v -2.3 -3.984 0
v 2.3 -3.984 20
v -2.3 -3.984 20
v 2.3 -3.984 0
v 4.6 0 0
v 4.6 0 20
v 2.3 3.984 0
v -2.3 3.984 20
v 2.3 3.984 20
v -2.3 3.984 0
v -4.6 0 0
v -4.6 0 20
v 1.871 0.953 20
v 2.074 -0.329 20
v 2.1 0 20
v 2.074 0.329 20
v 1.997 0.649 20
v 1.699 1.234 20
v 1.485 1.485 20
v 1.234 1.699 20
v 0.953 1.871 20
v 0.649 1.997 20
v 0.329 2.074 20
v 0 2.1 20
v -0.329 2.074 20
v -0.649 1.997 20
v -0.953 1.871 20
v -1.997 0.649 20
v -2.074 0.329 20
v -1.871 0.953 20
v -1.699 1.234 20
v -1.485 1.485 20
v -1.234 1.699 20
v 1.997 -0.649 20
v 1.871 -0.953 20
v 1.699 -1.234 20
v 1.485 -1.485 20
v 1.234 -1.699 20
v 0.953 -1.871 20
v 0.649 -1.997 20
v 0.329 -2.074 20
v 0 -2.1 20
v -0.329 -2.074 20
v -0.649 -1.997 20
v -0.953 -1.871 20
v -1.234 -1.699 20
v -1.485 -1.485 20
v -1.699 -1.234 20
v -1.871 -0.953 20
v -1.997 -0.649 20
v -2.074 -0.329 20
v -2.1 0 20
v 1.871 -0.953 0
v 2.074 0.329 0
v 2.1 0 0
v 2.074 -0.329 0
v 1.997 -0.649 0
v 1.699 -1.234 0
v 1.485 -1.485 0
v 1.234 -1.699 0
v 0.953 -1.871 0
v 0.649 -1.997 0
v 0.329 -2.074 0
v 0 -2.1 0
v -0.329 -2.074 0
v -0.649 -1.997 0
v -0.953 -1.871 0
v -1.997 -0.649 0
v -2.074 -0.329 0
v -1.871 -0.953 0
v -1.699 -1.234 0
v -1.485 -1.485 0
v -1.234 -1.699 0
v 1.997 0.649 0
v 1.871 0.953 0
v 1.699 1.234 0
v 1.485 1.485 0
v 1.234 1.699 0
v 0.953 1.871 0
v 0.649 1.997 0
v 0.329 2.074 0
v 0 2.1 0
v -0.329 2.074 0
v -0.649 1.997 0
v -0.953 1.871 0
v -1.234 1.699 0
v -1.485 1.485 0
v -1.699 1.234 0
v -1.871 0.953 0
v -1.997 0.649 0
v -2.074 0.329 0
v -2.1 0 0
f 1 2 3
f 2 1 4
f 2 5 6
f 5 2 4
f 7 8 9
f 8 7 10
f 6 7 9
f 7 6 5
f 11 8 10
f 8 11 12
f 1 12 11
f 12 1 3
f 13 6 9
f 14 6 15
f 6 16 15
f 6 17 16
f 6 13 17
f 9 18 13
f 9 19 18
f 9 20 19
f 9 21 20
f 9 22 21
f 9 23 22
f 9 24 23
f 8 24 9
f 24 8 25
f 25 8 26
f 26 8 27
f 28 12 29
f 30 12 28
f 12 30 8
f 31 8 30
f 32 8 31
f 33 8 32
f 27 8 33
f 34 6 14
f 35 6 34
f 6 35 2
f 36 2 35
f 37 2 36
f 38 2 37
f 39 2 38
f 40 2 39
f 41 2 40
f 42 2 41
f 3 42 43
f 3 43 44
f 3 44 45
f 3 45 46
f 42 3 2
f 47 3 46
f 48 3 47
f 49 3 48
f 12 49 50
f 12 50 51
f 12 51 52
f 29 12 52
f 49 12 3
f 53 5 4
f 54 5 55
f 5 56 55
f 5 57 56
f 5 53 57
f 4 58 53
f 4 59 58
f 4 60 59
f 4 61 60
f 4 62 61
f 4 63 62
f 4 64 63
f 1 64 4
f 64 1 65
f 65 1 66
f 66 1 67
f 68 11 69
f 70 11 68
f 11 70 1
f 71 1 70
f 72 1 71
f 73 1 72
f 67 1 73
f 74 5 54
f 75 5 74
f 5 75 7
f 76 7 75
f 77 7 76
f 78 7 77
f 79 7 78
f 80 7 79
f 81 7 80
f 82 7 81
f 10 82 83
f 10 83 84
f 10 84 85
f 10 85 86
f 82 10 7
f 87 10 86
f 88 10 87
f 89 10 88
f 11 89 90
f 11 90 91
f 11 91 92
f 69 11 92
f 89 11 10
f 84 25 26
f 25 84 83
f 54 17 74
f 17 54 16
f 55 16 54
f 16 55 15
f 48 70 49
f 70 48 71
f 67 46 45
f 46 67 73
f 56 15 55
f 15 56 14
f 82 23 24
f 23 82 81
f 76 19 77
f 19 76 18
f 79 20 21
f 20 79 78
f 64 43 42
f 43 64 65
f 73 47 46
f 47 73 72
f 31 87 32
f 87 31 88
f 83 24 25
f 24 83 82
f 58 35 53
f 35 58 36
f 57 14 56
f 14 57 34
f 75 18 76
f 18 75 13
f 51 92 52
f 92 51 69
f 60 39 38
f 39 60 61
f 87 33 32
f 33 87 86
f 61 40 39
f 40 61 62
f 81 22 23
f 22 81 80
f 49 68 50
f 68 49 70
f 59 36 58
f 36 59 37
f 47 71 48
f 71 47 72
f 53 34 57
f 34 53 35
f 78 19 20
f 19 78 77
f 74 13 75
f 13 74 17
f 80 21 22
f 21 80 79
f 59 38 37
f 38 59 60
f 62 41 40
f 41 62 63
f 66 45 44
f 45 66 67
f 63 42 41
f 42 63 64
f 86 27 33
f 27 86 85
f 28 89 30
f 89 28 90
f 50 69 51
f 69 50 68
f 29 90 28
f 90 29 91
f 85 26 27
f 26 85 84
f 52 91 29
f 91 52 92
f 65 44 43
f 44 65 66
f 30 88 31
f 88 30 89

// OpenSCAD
//Altura
h=20;
//Dimensiones interior
di=4.2;
ti=40;
//Dimensiones exterior
de=9.2;
te=6;


difference(){
cylinder(r=de/2,h,$fn=te);
cylinder(r=di/2,h+1.2,$fn=ti);}
